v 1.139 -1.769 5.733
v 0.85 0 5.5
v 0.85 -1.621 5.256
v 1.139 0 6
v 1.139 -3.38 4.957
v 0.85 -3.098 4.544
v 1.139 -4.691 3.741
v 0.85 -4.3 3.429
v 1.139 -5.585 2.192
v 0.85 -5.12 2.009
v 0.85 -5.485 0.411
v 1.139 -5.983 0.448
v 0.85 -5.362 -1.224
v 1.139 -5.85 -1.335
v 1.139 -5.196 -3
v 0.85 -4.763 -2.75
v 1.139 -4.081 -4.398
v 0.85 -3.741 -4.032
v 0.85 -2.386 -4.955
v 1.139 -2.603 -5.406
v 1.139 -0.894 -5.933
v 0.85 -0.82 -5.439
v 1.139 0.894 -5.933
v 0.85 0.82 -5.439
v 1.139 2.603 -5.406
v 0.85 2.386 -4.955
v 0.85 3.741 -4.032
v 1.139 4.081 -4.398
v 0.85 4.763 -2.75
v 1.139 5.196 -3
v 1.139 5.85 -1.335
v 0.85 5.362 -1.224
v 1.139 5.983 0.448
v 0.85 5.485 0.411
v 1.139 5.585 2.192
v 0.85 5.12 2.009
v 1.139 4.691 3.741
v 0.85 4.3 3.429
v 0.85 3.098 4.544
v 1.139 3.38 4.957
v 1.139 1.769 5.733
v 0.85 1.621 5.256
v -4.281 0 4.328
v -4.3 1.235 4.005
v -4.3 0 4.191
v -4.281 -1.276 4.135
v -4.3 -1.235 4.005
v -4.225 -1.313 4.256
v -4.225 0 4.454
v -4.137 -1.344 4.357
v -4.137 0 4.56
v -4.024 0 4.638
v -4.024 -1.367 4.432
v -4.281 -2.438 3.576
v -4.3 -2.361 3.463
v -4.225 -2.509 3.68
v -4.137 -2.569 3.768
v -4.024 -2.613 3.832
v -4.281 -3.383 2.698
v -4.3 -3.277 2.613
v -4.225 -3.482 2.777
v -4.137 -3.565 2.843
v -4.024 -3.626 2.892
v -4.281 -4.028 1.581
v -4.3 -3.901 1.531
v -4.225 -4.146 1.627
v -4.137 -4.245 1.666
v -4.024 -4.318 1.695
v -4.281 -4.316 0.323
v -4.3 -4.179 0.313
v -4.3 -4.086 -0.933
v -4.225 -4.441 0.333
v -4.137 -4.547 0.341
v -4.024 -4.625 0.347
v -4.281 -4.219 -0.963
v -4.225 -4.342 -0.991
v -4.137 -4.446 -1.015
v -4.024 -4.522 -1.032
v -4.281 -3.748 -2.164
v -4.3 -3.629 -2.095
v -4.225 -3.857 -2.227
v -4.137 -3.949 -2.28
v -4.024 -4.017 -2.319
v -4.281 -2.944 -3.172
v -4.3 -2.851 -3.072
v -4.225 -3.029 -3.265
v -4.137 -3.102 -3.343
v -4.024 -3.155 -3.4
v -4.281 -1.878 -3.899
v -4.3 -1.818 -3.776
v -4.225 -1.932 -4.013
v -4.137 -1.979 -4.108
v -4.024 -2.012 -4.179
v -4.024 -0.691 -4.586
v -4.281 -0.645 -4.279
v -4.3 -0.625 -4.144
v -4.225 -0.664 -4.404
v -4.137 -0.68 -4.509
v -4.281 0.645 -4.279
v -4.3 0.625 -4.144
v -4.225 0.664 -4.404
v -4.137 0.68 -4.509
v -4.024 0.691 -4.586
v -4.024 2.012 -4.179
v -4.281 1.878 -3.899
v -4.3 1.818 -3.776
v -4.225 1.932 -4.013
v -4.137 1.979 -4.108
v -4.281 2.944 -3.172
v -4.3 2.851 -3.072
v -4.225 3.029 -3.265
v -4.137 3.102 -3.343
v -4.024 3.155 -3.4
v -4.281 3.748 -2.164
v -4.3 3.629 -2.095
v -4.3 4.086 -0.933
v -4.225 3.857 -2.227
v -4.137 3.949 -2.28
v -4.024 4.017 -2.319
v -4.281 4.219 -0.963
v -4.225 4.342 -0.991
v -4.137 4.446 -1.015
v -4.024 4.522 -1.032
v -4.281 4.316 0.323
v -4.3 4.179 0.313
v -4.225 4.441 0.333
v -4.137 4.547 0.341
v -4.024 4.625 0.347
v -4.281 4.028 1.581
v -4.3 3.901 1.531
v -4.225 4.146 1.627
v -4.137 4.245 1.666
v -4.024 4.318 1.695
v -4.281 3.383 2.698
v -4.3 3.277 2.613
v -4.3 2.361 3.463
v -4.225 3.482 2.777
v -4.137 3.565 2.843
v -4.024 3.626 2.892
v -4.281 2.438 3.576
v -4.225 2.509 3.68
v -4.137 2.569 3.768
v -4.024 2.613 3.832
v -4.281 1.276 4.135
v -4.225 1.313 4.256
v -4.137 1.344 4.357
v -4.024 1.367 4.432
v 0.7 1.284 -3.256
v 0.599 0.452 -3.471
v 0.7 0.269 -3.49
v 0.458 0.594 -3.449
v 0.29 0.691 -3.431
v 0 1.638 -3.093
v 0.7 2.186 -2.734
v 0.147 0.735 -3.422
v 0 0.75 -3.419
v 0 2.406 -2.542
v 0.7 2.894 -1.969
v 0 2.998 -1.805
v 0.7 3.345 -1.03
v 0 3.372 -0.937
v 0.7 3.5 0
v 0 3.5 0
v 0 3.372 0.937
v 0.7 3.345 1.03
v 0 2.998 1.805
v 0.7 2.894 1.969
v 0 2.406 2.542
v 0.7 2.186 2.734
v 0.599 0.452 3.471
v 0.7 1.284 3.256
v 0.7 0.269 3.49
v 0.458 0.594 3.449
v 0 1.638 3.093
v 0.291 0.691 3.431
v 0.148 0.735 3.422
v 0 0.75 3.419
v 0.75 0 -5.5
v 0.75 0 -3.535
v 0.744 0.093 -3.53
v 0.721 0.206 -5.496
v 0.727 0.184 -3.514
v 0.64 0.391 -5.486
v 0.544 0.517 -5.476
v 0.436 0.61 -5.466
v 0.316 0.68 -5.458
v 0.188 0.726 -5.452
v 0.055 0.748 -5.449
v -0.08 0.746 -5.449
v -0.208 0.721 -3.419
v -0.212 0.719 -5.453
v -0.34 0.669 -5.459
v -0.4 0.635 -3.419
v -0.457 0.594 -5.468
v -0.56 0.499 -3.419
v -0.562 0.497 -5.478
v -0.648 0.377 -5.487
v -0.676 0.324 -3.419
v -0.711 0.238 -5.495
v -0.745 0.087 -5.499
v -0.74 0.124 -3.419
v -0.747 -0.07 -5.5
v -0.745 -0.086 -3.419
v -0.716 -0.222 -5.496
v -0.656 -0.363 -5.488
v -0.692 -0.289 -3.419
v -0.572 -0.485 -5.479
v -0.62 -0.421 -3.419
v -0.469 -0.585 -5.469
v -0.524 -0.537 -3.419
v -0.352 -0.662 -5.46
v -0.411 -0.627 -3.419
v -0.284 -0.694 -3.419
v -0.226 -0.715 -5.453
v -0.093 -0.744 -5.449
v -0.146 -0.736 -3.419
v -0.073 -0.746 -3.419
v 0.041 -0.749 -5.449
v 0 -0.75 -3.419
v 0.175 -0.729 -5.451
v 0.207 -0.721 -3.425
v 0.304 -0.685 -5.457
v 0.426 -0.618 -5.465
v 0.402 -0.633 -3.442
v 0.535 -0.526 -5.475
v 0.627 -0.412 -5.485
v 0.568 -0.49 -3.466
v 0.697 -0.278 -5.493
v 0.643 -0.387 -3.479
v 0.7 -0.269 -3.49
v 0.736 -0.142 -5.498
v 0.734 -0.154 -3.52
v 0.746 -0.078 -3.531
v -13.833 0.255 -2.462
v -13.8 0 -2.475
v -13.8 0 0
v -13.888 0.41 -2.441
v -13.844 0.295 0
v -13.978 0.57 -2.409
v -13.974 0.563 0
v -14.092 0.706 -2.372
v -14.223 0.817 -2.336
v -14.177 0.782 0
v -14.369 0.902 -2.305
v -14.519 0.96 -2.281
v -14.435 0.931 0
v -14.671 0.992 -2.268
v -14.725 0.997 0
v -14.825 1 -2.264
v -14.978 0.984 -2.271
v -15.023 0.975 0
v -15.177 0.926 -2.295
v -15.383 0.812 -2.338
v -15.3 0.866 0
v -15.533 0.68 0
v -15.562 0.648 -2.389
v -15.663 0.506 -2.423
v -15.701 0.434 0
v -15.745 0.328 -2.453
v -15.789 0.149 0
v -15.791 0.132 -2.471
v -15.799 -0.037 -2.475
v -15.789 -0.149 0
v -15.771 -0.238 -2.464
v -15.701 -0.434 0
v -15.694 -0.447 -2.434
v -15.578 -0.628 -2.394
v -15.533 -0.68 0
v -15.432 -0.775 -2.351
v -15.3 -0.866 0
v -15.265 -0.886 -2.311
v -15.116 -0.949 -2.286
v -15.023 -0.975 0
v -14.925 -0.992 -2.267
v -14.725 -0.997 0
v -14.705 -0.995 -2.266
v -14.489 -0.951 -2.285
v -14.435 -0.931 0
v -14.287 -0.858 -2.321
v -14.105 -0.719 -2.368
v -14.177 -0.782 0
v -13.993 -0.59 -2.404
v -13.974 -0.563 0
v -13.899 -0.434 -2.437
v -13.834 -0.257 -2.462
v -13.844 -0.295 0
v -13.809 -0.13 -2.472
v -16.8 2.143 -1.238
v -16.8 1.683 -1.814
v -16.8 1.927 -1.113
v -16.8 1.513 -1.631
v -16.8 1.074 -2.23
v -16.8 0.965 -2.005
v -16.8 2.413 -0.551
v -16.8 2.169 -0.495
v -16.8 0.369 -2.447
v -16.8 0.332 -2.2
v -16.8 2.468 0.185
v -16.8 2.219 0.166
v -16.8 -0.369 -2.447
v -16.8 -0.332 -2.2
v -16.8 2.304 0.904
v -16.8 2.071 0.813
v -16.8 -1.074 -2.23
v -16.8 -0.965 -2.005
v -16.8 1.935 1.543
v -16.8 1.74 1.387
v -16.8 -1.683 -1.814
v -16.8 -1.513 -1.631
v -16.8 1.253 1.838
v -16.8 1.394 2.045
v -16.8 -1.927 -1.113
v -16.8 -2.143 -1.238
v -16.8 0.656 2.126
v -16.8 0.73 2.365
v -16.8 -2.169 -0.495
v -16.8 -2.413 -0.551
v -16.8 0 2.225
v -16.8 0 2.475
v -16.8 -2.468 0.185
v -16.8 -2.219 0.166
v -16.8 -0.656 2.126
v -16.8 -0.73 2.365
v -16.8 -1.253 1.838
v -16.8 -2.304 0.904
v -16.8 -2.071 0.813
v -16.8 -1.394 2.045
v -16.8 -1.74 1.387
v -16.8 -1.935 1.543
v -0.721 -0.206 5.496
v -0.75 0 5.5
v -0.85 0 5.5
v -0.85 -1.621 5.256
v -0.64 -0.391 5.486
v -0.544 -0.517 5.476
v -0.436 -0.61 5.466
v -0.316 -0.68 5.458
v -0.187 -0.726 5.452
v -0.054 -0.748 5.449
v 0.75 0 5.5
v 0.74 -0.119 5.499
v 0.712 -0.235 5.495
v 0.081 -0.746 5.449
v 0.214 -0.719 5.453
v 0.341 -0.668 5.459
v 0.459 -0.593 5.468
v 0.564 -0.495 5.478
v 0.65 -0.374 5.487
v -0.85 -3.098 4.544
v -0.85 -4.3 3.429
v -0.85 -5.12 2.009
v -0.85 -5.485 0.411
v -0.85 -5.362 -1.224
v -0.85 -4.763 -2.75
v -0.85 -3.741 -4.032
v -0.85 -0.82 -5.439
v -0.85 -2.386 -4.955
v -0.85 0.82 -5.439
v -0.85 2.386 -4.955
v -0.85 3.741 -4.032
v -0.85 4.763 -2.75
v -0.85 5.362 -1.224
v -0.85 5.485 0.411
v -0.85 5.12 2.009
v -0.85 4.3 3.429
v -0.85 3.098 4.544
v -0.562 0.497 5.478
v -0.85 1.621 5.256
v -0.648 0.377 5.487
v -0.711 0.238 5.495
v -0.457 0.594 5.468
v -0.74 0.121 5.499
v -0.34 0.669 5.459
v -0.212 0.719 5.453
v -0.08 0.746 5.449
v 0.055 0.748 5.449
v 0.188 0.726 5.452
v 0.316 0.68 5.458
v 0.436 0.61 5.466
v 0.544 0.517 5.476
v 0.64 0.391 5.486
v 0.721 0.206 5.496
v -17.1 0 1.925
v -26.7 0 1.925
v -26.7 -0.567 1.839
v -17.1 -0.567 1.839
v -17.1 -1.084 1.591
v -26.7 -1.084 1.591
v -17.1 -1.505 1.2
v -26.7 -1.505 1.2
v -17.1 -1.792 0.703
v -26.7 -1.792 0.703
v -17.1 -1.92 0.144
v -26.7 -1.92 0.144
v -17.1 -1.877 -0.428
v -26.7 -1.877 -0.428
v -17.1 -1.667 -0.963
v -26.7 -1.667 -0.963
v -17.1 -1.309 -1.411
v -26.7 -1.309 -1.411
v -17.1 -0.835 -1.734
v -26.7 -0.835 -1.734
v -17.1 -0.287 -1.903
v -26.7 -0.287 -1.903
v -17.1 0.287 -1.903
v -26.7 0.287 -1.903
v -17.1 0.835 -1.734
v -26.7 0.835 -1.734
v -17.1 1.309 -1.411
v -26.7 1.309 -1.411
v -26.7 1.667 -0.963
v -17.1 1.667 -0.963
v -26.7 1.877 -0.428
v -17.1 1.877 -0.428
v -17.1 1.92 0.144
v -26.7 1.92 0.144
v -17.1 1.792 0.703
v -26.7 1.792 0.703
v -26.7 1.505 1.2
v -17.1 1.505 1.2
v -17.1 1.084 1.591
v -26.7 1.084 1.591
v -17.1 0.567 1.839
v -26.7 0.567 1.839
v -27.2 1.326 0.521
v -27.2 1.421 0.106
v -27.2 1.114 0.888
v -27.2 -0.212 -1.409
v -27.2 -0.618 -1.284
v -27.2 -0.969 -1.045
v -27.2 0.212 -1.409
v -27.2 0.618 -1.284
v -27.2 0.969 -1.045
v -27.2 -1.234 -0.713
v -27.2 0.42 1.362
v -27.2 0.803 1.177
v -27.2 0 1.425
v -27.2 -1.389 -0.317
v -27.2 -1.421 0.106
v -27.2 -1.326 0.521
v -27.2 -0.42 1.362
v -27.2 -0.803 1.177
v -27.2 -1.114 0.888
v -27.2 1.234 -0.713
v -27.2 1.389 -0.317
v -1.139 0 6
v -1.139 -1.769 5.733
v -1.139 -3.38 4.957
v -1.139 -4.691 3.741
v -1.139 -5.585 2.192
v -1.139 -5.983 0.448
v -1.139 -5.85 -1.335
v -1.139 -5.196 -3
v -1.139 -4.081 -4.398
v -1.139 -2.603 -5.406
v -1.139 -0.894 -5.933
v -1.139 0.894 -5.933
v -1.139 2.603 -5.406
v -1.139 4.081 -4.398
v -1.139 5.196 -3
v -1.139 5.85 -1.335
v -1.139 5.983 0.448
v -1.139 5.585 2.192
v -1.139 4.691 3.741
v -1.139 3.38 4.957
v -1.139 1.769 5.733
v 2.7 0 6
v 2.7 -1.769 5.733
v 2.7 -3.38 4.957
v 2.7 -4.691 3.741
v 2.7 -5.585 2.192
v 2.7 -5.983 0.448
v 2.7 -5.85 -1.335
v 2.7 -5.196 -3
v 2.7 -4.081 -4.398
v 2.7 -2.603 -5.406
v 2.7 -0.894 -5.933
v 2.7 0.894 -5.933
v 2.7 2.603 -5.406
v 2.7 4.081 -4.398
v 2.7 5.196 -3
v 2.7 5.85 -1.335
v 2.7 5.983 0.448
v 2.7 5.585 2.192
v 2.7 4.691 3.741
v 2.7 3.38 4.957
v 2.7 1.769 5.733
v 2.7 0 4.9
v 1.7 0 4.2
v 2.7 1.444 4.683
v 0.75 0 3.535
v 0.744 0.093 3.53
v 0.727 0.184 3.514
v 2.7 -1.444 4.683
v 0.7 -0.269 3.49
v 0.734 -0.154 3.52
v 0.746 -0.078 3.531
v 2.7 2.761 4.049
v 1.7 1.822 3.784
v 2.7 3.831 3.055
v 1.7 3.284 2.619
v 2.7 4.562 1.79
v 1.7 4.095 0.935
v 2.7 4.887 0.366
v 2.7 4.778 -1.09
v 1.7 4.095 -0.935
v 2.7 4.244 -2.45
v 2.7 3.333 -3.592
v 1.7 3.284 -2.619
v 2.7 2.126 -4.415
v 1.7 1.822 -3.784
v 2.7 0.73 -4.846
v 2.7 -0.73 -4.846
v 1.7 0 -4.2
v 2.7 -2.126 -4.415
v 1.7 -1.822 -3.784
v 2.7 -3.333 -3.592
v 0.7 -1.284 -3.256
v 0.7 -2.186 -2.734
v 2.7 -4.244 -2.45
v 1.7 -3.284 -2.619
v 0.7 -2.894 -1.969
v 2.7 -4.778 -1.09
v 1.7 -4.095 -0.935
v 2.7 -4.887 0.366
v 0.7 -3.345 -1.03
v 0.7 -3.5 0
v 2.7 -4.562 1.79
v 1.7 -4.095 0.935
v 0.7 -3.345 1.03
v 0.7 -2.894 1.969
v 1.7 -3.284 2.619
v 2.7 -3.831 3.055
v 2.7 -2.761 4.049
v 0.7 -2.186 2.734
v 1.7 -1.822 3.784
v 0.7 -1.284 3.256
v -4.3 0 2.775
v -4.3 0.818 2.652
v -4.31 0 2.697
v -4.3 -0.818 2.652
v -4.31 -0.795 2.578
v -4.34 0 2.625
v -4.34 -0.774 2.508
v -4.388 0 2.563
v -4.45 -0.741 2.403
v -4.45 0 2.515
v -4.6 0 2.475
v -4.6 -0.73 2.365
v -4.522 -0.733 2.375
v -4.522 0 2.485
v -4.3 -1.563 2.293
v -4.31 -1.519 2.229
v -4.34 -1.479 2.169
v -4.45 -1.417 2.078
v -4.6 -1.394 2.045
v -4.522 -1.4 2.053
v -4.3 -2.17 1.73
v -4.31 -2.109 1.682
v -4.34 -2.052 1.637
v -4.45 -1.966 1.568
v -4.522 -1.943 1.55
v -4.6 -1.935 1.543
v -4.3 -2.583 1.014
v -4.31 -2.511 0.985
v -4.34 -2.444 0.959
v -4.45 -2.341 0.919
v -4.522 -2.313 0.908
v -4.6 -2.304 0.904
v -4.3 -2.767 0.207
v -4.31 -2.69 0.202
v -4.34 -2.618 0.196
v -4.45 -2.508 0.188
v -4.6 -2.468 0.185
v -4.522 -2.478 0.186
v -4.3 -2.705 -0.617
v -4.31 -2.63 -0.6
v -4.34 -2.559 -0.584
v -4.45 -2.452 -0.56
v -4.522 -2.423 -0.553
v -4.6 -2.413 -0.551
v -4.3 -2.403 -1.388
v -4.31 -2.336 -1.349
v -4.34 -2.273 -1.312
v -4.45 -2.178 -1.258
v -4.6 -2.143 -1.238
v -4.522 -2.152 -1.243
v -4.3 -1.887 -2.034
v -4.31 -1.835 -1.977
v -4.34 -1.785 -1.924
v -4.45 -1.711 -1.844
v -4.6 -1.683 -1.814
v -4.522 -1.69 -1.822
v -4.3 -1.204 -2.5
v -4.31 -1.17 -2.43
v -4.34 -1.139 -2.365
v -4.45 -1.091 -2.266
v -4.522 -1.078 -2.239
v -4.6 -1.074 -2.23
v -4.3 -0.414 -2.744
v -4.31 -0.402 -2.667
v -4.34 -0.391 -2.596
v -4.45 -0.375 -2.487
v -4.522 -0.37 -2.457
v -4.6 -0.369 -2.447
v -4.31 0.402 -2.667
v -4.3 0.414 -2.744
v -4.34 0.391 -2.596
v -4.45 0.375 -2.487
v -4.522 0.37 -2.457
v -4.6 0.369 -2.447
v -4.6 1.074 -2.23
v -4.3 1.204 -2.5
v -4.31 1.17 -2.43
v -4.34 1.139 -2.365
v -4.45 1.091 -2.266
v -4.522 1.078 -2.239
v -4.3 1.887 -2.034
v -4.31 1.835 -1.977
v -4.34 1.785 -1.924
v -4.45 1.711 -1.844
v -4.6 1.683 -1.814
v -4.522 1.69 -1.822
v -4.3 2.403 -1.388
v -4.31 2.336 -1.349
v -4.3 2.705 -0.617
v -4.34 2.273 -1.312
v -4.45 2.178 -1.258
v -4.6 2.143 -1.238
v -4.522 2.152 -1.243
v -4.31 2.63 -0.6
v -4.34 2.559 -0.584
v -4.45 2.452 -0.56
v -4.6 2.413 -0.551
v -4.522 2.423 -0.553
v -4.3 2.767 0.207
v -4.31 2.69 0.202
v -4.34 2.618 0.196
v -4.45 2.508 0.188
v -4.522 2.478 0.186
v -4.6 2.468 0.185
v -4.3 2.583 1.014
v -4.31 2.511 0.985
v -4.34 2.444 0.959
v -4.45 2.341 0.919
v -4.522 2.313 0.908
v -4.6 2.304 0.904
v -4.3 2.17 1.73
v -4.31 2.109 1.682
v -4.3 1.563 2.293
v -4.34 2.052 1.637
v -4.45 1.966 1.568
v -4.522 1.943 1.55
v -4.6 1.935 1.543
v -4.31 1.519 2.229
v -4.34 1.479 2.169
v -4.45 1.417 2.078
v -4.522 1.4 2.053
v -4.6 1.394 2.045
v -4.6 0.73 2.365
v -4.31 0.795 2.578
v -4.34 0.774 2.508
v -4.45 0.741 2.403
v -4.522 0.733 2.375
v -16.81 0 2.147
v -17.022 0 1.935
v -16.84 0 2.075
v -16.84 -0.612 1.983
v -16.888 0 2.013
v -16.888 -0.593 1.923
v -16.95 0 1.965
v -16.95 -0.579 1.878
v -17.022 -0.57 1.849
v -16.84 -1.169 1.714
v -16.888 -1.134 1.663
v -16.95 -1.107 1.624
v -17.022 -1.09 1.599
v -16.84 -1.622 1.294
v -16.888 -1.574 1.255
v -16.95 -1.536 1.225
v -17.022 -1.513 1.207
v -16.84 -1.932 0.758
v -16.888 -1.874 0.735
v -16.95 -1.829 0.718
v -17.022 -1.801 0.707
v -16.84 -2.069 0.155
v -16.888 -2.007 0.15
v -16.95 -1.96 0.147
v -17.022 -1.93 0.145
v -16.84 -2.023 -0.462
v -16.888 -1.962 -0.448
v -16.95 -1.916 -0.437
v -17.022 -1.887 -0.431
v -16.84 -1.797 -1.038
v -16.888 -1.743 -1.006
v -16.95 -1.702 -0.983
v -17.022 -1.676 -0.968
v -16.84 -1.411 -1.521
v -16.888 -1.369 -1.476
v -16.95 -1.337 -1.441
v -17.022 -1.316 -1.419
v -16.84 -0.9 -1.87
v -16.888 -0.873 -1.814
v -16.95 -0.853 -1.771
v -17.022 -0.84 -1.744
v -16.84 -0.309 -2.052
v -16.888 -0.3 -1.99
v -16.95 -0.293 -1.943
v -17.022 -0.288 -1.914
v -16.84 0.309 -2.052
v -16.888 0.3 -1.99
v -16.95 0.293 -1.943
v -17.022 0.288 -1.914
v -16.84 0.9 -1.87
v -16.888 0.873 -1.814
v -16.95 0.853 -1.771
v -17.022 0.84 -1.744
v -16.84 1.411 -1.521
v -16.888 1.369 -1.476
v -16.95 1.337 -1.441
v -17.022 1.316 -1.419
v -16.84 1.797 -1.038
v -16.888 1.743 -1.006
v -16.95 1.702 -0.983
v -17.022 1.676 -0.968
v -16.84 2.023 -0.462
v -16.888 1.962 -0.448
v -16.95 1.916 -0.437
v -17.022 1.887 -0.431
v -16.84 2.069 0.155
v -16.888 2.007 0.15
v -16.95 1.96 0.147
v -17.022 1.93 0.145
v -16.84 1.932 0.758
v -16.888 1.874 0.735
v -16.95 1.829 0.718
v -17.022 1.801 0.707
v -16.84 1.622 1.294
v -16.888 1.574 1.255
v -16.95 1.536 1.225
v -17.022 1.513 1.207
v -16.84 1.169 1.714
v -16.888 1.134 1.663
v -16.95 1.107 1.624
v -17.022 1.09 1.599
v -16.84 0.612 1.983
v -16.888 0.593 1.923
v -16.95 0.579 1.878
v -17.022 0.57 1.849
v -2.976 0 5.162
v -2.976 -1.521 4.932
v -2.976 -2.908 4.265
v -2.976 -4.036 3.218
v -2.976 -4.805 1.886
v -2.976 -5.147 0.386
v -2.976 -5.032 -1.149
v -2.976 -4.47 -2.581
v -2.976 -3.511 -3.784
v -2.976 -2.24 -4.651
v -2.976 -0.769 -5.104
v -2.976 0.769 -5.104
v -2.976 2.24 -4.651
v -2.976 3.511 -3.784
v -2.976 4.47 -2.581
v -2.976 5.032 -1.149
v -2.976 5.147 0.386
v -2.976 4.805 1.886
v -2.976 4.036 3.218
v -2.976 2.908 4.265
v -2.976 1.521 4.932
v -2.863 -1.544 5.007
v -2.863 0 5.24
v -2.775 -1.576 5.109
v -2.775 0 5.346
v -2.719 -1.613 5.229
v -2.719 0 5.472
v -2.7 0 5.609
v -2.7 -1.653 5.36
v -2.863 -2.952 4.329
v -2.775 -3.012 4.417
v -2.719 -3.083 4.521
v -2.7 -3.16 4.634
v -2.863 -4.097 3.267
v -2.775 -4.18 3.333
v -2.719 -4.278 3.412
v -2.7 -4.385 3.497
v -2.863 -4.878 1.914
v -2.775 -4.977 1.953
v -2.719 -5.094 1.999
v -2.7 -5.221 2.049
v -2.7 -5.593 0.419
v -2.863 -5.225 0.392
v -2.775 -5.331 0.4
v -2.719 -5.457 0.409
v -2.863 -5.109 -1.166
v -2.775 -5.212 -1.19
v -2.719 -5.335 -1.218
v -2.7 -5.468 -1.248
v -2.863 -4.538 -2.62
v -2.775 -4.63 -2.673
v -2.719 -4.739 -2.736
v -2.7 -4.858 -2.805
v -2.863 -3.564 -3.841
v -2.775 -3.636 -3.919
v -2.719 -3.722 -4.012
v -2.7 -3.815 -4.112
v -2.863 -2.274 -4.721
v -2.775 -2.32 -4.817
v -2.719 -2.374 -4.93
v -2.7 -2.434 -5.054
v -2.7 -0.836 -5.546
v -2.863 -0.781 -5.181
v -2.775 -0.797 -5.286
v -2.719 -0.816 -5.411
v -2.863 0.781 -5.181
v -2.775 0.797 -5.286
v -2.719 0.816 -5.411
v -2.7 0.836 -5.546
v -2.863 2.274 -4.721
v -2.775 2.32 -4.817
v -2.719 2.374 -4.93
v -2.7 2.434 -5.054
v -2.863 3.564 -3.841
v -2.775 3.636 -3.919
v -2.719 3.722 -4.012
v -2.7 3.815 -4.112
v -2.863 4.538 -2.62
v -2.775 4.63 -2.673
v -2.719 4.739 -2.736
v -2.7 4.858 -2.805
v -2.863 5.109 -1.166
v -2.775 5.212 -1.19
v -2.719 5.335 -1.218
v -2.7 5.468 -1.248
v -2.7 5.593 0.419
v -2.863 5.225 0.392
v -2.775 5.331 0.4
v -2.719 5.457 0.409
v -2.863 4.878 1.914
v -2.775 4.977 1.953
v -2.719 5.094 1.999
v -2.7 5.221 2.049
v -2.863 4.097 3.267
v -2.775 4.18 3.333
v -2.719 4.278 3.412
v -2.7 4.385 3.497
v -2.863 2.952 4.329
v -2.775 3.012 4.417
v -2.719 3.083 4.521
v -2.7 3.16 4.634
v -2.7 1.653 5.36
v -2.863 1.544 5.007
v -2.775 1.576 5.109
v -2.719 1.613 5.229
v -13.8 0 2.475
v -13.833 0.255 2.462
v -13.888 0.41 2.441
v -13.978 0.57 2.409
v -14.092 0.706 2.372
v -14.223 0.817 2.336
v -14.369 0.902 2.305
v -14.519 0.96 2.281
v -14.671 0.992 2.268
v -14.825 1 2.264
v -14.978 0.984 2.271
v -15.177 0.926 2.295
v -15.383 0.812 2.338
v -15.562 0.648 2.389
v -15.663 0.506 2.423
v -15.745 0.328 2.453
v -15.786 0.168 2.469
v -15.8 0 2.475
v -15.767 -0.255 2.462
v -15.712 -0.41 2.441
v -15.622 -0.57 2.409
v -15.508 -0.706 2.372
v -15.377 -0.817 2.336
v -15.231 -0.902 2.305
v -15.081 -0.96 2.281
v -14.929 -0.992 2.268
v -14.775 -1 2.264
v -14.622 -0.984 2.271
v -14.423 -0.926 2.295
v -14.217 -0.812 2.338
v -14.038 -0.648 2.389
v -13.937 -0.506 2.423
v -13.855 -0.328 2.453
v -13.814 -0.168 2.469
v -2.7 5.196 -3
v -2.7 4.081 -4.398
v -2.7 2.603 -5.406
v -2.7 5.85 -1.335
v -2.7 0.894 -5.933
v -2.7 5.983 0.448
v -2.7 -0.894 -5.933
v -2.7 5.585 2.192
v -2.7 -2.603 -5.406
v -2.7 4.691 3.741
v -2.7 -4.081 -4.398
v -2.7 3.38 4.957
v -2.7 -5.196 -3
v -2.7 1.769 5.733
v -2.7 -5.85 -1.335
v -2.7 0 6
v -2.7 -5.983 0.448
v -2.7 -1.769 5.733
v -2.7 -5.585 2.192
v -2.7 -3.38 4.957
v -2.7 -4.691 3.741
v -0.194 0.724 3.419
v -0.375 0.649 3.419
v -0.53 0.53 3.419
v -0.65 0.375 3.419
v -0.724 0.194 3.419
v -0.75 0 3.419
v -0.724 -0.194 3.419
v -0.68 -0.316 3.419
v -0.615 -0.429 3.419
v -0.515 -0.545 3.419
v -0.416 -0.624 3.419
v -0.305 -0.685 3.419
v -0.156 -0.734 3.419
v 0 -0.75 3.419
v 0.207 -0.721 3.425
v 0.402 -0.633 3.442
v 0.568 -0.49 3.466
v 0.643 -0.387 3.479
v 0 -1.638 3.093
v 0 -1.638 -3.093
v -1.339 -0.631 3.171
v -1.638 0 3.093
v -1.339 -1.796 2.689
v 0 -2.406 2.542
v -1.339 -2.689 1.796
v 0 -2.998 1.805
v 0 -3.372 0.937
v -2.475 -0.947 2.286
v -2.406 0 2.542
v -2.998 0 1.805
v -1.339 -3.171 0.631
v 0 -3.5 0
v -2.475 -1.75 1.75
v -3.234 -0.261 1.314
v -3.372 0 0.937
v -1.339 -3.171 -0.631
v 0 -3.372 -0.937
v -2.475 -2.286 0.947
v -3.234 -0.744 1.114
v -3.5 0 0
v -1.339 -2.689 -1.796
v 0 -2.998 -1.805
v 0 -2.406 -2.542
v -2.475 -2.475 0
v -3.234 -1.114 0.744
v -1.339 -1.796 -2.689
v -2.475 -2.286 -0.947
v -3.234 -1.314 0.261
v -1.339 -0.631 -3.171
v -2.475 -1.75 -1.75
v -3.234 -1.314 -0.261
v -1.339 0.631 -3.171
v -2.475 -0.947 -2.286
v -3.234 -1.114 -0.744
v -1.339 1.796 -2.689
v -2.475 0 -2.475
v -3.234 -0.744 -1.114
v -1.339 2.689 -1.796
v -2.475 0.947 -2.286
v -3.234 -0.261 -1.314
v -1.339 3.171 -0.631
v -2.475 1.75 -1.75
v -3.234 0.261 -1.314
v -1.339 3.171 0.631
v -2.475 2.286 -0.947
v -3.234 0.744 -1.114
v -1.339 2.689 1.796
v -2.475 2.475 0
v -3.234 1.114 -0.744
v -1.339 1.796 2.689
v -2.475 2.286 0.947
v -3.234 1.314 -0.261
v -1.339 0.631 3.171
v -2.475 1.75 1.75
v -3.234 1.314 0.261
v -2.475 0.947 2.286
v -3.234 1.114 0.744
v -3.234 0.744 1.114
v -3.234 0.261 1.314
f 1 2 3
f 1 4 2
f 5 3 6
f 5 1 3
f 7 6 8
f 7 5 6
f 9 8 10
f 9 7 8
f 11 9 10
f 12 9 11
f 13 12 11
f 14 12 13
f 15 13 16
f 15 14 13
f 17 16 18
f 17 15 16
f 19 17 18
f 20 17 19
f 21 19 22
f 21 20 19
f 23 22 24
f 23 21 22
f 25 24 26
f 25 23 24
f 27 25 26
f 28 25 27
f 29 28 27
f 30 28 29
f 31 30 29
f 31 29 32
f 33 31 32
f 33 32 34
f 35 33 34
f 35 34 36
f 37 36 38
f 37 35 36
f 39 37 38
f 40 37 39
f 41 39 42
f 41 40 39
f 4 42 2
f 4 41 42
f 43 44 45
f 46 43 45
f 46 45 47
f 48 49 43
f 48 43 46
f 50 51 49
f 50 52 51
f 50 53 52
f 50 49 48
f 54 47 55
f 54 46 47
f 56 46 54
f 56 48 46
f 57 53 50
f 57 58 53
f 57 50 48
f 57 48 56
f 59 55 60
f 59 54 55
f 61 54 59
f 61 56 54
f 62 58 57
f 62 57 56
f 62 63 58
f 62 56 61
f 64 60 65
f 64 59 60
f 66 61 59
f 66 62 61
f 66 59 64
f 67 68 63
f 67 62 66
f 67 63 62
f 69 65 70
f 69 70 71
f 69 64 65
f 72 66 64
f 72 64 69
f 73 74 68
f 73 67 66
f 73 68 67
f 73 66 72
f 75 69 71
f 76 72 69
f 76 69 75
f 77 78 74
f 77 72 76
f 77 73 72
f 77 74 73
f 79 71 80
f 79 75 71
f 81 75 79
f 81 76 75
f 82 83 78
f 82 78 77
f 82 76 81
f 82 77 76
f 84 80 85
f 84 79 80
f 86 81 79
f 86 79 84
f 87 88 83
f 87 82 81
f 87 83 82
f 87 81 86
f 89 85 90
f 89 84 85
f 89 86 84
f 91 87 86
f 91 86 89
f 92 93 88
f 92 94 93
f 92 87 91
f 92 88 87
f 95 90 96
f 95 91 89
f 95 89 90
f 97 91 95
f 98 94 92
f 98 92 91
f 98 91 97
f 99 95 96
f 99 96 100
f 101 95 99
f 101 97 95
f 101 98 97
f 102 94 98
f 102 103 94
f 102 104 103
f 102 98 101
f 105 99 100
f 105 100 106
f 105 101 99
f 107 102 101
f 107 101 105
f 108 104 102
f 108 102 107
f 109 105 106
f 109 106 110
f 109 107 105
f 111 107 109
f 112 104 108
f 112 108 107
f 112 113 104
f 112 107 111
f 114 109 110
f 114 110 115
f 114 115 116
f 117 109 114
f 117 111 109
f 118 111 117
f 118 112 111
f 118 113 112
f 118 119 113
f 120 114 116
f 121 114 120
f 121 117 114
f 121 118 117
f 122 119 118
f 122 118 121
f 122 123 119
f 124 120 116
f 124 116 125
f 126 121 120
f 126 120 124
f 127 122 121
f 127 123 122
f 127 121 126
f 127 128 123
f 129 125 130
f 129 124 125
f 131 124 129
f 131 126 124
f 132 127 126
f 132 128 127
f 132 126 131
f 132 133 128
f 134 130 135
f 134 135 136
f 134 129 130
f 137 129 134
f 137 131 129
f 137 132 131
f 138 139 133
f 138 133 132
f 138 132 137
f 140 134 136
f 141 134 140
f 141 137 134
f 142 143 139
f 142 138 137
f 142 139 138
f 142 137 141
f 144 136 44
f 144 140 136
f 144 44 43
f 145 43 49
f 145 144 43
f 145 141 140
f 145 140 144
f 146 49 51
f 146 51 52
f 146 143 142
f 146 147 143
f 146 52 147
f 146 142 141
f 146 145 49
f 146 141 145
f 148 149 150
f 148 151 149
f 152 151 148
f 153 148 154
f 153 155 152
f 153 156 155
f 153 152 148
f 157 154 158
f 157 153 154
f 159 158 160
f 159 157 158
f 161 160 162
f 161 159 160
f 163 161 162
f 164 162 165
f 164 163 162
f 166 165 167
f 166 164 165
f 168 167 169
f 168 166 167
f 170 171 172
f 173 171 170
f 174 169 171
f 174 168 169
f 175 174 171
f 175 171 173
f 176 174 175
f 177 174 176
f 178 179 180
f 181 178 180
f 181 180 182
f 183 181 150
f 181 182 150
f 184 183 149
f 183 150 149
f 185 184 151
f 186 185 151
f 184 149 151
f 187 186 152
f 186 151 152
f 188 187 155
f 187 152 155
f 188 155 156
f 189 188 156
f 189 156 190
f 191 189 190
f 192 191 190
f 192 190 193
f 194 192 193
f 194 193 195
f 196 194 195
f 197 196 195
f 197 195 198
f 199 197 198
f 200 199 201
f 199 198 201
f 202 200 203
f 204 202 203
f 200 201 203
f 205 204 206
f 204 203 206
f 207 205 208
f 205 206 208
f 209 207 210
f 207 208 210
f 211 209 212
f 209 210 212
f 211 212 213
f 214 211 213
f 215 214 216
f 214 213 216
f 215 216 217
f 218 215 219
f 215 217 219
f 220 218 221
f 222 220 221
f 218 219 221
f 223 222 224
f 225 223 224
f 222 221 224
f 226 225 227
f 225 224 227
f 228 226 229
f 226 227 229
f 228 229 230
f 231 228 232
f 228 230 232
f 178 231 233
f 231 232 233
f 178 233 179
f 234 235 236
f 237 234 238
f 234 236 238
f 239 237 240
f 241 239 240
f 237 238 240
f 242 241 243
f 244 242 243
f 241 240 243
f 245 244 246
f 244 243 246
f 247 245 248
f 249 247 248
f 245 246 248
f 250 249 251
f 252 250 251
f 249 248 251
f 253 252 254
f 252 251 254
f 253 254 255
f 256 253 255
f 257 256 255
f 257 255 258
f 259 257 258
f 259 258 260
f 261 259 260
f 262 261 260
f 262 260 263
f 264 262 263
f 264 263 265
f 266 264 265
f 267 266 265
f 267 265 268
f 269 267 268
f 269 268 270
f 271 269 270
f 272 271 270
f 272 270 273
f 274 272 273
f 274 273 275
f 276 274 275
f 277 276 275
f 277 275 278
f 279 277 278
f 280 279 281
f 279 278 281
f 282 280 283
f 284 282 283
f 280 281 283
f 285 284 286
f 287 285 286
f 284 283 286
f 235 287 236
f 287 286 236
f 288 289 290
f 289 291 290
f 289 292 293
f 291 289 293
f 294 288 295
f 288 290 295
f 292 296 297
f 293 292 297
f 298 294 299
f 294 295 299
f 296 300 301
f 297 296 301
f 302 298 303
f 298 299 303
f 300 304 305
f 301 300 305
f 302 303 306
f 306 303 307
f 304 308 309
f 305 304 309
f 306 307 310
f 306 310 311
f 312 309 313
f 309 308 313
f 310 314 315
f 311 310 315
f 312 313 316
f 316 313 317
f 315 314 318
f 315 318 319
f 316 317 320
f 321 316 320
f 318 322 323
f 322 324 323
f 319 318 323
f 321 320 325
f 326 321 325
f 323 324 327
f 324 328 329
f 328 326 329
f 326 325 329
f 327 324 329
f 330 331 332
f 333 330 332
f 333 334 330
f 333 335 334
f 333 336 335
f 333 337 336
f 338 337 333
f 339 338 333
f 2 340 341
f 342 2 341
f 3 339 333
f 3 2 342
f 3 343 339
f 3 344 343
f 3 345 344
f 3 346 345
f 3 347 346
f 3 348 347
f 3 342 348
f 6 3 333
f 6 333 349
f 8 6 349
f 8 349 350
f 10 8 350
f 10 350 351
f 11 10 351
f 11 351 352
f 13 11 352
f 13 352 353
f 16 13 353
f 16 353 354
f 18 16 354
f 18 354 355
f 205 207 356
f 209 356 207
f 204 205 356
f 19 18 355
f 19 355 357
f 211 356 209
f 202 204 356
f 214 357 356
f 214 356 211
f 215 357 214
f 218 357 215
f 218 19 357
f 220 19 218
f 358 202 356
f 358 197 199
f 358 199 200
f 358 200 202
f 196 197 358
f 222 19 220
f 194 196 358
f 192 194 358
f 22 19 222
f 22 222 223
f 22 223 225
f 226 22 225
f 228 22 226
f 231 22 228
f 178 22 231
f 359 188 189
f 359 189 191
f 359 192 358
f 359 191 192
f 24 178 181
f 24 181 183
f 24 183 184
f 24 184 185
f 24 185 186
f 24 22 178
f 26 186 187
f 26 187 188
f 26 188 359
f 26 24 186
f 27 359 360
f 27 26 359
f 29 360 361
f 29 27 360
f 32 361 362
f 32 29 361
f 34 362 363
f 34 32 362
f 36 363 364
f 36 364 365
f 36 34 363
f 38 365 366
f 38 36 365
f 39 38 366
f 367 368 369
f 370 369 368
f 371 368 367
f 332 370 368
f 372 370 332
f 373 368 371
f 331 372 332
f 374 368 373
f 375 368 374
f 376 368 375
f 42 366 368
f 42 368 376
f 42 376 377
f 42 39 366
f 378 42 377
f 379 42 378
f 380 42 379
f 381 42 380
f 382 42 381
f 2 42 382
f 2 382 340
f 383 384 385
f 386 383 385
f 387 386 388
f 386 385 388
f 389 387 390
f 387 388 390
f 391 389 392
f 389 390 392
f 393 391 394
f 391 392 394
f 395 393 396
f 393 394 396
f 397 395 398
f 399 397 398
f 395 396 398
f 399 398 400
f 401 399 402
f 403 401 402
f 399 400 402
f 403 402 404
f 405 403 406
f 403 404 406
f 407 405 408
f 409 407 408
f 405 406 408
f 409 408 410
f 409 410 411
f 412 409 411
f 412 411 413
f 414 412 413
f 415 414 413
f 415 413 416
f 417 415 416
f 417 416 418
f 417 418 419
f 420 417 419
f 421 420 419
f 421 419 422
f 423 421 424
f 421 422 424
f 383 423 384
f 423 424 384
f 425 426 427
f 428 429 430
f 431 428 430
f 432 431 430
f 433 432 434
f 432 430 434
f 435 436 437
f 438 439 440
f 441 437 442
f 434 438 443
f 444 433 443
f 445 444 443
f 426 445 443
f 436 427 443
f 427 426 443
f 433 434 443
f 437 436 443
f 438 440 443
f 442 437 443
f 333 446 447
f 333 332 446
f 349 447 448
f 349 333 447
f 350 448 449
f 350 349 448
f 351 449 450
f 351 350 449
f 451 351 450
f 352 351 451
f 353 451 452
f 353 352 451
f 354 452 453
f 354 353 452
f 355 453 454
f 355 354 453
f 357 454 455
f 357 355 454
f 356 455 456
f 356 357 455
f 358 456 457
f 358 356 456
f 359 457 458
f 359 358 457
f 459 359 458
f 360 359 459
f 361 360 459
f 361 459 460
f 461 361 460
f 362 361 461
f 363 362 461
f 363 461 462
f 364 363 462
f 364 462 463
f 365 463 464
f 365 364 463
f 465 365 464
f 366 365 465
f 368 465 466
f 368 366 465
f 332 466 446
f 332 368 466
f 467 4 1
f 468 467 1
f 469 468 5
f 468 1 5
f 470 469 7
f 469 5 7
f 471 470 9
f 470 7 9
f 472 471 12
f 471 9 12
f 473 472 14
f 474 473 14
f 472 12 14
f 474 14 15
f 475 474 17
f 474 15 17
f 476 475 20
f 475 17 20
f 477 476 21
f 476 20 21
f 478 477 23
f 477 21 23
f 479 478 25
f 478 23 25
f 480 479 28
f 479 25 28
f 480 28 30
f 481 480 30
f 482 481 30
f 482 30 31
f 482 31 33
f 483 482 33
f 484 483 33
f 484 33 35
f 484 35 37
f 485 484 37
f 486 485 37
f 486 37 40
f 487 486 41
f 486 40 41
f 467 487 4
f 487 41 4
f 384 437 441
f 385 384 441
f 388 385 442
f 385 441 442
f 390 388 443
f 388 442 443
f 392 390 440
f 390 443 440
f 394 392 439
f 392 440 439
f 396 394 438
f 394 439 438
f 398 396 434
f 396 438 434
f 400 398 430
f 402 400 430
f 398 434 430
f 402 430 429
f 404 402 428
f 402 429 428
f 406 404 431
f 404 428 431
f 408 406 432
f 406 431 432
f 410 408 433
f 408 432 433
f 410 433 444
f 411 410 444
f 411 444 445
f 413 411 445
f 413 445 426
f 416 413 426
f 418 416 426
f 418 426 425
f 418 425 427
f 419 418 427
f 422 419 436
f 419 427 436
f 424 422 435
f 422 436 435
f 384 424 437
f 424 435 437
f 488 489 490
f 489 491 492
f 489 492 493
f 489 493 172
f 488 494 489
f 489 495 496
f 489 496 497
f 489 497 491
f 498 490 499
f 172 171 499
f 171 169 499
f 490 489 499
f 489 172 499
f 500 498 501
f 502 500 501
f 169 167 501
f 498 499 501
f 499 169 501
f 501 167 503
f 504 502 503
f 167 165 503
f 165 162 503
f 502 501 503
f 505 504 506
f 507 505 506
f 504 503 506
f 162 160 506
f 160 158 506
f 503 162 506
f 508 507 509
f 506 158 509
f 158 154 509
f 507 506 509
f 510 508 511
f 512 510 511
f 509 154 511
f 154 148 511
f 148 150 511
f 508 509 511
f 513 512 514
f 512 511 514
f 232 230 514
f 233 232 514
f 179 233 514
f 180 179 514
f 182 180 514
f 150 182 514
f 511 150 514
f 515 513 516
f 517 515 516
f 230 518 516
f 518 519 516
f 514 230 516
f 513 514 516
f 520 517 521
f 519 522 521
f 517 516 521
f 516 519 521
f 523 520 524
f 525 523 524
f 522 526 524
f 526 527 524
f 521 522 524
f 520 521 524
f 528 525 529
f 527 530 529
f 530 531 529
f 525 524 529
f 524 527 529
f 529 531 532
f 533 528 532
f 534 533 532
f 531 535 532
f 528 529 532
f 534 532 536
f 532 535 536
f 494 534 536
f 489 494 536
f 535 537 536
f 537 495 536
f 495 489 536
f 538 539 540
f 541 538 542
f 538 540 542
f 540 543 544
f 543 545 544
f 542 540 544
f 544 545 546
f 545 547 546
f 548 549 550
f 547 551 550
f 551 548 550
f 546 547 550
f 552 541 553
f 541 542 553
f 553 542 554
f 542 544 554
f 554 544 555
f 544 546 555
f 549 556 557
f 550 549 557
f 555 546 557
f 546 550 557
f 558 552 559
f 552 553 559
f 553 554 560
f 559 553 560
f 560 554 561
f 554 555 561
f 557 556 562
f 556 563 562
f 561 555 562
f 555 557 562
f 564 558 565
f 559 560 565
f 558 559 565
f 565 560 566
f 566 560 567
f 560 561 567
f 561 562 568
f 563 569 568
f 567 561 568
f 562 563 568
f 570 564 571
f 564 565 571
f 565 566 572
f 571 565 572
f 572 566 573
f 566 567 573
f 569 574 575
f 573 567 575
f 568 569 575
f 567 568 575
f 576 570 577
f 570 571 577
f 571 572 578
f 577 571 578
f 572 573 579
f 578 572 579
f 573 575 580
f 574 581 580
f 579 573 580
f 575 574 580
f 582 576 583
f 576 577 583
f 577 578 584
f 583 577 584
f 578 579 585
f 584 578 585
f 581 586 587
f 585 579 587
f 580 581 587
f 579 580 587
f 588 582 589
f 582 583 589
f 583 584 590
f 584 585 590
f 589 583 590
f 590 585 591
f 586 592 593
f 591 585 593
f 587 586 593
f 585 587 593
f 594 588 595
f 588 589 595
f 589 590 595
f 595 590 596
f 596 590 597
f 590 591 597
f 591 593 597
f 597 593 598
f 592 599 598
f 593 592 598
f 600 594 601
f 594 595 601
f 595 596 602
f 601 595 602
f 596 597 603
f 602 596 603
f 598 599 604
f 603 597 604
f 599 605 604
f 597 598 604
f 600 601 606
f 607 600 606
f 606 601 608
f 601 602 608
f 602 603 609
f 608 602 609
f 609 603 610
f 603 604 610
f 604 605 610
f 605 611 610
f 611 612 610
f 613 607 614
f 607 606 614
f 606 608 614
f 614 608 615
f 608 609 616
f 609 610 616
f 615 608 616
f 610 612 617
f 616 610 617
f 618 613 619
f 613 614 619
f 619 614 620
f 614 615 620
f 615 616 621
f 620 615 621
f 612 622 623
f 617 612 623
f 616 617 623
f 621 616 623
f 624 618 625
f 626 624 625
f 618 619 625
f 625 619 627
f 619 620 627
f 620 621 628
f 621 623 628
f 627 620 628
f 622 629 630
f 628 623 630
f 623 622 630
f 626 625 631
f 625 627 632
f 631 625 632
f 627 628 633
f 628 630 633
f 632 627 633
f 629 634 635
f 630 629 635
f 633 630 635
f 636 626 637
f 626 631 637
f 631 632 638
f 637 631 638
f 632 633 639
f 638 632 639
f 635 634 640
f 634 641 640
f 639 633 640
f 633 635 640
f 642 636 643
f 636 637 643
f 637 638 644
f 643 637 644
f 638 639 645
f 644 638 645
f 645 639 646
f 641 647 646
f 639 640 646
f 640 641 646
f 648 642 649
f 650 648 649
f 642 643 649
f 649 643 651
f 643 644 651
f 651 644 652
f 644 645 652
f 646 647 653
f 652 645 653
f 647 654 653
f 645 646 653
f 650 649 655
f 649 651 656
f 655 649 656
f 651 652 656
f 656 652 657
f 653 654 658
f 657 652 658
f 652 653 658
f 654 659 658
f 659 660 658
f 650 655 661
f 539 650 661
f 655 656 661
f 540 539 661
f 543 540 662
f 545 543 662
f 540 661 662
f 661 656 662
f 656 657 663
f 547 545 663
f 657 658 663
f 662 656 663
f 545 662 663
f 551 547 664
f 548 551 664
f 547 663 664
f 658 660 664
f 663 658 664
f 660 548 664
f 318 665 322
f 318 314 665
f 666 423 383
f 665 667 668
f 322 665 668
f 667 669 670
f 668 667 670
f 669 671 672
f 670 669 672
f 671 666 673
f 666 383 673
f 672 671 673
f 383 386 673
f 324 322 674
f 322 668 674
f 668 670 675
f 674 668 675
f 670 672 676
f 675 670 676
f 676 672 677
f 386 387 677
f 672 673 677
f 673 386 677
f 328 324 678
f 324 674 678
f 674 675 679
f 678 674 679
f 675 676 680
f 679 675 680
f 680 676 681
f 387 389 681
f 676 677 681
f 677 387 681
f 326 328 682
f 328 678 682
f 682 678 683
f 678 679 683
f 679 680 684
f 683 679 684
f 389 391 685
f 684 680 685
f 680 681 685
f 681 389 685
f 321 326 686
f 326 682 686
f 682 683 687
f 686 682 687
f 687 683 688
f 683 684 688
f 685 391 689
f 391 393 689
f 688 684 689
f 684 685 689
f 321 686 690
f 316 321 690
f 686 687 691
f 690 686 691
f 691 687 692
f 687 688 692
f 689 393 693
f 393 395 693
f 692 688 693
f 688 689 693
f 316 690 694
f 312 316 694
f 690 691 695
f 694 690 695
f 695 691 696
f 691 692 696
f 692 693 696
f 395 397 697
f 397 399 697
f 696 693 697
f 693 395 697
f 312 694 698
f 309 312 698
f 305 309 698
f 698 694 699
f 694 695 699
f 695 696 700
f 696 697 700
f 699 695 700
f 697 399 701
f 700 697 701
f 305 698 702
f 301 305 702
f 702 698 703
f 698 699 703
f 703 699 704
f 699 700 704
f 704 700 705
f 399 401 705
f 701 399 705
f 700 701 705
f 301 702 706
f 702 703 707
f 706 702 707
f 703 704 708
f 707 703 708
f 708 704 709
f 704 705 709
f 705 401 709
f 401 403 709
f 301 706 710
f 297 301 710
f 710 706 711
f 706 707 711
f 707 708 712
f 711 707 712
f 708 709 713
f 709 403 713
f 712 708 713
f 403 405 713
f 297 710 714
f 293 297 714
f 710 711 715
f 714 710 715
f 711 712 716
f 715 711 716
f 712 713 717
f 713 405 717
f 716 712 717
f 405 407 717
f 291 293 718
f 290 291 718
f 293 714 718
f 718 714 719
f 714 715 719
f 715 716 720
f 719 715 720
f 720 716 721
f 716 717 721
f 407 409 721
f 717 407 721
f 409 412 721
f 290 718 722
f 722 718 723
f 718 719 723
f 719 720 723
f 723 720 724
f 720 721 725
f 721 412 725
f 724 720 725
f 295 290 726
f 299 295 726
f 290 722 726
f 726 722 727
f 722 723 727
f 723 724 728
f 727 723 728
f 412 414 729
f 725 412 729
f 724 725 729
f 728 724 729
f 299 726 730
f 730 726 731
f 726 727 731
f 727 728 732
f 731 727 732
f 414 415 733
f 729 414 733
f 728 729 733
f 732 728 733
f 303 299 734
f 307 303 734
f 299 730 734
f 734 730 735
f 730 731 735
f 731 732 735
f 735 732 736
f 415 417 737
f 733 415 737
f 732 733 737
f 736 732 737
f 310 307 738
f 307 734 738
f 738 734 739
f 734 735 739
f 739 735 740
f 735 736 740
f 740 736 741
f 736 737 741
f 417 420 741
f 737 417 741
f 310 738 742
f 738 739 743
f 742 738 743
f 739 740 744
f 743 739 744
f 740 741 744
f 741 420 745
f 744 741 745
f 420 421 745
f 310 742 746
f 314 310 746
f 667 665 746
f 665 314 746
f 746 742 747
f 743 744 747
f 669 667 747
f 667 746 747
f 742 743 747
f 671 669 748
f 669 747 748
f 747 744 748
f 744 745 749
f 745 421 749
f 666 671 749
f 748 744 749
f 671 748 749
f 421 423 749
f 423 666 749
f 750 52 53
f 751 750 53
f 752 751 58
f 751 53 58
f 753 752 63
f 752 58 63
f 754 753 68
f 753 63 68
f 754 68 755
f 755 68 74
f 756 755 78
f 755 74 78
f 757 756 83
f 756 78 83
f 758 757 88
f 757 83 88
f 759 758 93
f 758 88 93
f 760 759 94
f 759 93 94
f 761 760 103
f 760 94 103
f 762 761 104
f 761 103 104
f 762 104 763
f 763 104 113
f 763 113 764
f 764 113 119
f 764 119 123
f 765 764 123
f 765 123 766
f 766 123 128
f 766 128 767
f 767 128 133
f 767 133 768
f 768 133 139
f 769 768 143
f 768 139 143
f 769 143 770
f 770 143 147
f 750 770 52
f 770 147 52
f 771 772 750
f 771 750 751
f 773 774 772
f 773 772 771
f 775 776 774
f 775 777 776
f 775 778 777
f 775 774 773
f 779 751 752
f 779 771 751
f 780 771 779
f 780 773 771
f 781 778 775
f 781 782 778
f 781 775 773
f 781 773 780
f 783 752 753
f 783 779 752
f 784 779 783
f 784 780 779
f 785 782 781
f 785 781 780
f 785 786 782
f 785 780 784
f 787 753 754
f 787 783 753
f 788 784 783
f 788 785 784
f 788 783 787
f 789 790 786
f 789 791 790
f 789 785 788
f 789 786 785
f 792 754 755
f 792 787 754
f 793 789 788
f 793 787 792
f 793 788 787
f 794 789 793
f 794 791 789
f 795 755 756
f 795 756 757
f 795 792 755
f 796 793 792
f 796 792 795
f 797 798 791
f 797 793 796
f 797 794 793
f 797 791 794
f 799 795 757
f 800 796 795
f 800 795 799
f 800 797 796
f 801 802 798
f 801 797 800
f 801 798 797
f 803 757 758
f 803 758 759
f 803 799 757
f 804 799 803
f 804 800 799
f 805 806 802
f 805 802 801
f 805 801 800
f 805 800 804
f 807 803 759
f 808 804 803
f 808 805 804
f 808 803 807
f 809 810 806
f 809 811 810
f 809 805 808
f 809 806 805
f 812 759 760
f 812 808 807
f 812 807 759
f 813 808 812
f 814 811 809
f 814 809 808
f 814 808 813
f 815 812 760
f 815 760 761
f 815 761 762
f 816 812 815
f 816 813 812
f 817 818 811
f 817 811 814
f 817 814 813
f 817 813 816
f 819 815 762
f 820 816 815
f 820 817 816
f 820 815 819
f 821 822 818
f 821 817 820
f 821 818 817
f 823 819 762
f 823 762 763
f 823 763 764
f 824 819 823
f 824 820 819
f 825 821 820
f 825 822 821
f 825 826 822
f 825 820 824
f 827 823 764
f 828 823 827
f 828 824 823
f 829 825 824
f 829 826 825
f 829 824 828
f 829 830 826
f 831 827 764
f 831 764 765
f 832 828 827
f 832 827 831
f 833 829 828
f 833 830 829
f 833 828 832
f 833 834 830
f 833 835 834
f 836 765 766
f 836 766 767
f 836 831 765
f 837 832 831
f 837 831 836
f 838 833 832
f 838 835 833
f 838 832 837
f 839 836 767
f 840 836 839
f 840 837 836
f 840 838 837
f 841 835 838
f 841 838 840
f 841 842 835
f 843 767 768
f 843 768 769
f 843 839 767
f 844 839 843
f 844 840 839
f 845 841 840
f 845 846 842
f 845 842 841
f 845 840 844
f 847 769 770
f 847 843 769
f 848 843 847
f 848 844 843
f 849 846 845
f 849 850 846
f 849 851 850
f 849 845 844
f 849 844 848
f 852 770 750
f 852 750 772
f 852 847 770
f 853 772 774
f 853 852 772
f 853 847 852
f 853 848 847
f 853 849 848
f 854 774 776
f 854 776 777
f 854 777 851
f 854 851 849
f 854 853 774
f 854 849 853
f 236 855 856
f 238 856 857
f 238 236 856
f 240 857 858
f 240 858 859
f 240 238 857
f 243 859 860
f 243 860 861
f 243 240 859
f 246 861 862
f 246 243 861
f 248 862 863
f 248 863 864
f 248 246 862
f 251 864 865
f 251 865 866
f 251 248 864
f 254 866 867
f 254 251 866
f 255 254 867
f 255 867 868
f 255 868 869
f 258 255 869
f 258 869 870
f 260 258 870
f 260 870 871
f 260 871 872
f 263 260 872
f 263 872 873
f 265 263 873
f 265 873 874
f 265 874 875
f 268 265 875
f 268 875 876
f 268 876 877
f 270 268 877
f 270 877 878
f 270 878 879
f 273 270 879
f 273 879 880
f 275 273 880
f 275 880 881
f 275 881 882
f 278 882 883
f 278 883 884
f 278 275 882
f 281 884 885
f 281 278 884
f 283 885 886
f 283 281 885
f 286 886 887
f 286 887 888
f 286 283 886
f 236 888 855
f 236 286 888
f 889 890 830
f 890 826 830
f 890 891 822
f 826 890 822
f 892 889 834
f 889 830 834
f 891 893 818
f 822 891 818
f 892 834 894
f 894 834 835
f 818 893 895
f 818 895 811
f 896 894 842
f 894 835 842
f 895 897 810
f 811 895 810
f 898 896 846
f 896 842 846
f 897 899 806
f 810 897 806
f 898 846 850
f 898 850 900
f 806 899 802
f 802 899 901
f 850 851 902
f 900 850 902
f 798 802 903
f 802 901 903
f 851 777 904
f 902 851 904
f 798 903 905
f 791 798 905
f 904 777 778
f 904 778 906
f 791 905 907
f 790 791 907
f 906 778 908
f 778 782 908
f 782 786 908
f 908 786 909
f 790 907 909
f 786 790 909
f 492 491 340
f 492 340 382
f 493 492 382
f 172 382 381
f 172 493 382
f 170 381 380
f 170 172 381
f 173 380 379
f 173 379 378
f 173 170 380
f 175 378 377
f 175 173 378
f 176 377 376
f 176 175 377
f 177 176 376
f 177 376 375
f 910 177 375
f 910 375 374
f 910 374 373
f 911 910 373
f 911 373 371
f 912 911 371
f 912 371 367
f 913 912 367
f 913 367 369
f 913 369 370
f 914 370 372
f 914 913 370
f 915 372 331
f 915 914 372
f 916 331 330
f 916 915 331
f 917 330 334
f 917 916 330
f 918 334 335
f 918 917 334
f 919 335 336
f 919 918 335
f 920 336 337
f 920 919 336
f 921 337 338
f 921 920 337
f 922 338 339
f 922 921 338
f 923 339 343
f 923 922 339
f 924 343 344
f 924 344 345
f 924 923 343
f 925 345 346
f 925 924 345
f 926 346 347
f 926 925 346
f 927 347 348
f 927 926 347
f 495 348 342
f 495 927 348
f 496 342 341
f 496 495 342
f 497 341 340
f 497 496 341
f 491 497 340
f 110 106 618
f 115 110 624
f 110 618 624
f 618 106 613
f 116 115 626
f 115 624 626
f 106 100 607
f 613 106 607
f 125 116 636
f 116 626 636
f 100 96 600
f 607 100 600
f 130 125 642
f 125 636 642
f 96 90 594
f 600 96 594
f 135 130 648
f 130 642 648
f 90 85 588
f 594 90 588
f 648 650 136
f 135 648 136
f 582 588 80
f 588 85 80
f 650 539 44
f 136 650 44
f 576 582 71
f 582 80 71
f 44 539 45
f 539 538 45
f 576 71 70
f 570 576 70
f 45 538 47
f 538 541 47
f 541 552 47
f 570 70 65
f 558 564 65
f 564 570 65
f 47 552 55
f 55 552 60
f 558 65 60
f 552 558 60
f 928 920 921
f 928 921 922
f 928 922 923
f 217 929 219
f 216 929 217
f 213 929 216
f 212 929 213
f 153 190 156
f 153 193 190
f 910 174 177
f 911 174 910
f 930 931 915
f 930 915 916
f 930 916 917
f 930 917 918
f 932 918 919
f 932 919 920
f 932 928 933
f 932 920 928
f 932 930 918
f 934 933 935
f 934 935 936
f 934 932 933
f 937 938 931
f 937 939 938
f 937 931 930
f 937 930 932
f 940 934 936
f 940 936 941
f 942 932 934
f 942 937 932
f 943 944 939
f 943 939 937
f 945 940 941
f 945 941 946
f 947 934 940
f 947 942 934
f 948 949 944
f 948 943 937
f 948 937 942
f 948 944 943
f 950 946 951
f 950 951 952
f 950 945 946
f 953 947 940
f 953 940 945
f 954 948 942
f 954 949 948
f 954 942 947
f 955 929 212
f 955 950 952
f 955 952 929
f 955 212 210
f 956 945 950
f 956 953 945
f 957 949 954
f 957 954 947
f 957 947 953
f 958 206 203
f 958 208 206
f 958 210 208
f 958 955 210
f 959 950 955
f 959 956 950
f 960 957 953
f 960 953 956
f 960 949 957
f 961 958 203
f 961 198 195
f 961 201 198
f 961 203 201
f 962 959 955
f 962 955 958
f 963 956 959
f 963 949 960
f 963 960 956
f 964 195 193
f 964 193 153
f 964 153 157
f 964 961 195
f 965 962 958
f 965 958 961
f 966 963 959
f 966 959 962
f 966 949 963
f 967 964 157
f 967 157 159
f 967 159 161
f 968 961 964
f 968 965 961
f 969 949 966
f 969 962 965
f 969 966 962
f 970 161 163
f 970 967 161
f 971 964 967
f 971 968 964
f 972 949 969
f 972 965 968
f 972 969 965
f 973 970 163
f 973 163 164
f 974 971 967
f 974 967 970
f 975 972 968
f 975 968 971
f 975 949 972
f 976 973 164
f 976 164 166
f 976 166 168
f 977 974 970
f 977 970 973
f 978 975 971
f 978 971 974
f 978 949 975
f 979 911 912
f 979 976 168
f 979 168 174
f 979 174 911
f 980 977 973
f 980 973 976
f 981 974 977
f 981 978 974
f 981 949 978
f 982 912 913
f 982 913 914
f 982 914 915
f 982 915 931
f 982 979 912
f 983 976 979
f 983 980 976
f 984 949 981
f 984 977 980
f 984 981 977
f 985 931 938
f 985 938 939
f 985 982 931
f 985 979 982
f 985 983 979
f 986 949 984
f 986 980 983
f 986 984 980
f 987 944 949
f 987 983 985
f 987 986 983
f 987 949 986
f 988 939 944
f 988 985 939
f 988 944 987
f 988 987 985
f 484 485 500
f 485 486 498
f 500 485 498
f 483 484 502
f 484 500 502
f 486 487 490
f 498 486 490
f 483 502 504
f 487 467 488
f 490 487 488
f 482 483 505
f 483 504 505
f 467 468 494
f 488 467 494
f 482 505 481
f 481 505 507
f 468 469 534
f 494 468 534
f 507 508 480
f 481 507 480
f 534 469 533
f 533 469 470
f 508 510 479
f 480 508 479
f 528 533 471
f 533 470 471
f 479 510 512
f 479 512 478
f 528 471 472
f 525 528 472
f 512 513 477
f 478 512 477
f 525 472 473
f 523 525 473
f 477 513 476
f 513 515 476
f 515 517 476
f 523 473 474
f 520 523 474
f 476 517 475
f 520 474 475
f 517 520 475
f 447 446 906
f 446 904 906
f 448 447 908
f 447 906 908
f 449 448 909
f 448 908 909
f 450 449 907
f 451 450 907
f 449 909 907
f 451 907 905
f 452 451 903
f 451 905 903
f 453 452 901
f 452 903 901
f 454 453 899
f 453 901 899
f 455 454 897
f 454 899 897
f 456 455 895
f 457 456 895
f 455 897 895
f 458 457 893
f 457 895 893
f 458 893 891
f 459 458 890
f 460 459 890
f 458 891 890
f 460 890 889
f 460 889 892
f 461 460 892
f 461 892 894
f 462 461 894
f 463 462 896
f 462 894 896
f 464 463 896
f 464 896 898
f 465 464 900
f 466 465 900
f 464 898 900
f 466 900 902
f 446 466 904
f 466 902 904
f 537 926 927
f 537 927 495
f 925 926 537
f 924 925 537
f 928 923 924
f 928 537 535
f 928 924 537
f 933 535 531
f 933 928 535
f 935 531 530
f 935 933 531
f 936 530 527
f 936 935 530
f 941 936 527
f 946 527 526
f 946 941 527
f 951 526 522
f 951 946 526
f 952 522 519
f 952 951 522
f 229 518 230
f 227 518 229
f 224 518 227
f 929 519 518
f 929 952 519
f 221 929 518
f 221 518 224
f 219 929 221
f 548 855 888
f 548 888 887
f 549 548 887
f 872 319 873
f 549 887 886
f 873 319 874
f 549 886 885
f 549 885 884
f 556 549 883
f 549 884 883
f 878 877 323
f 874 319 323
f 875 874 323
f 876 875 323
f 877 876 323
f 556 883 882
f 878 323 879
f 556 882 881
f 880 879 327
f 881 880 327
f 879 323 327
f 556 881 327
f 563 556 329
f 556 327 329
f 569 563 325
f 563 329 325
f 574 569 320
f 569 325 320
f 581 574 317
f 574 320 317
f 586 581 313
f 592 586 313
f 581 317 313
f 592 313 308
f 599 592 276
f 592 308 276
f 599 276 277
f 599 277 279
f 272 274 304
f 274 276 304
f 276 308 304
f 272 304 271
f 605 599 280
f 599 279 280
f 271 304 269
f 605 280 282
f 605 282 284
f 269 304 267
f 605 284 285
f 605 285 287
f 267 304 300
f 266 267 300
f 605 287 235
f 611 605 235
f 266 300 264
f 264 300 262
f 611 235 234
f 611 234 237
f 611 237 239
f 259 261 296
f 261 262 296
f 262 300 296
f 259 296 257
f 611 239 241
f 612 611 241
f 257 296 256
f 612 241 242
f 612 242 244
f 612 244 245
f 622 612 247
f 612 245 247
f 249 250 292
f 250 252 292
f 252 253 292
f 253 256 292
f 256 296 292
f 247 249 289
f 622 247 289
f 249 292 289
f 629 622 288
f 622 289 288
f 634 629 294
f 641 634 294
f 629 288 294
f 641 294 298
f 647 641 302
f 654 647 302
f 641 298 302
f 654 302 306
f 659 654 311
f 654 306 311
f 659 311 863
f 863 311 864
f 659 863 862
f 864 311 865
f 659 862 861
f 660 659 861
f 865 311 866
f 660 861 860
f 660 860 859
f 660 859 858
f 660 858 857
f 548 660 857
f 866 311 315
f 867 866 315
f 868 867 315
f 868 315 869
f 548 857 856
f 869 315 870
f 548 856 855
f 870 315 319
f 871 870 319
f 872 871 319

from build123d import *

# Parameters (mm, degrees)
F8_R          = 0.75
F8_R_2        = 1
F9_DEPTH      = 6.001
F9_DEPTH_BACK = 6.001
F11_SIZE      = 0.5
F12_R         = 0.5
F13_R         = 0.3


# Not quite as in the source:
# - a fillet or chamfer that OpenCascade refuses, or shapes differently, is made with other operations: its cross-section is extruded or revolved along the edge and cut away or added


with BuildPart() as f4:
    # F3 (on Front) → F4 (revolve)
    with BuildSketch(Plane.XZ):
        with BuildLine():
            Line((2.7, 6), (-2.7, 6))
            Line((-2.7, 6), (-2.7, 5.3))
            Line((-2.7, 5.3), (-4.3, 4.5))
            Line((-4.3, 4.5), (-4.3, 2.775))
            ThreePointArc((-4.3, 2.775), (-4.3878679656, 2.5628679656), (-4.6, 2.475))
            Line((-4.6, 2.475), (-16.8, 2.475))
            Line((-16.8, 2.475), (-16.8, 1.925))
            Line((-16.8, 1.925), (-27.2, 1.925))
            Line((-27.2, 1.925), (-27.2, 0))
            Line((-27.2, 0), (2.7, 0))
            Line((2.7, 0), (2.7, 6))
        make_face()
    revolve(axis=Axis((0, 0, 0), (1, 0, 0)))

    # F2 (on Front) → F5 (revolve, cut)
    with BuildSketch(Plane.XZ):
        with BuildLine():
            Line((5, 3.5), (0, 3.5))
            ThreePointArc((0, 3.5), (-2.4748737342, 2.4748737342), (-3.5, 0))
            Line((-3.5, 0), (5, 0))
            Line((5, 0), (5, 3.5))
        make_face()
    revolve(axis=Axis((0, 0, 0), (1, 0, 0)), mode=Mode.SUBTRACT)

    # F6 (on Front) → F7 (revolve, cut)
    with BuildSketch(Plane.XZ):
        Polygon((1.1386751346, 6), (-1.1386751346, 6), (-0.85, 5.5), (0.85, 5.5), align=None)
    revolve(axis=Axis((0, 0, 0), (1, 0, 0)), mode=Mode.SUBTRACT)

    # F8 (on Top) → F9 (cut, two sides)
    with BuildSketch(Plane.XY) as f9_sk:
        Circle(F8_R)
        with Locations((-14.8, 0)):
            Circle(F8_R_2)
    extrude(amount=-F9_DEPTH, mode=Mode.SUBTRACT)
    extrude(f9_sk.sketch, amount=F9_DEPTH_BACK, mode=Mode.SUBTRACT)

    # F10: chamfer of 2 x 1.4004150764 on 1 edges, made by hand

    # F10_s1 → F10_t2 (revolve, cut)
    with BuildSketch(Plane.XZ):
        Polygon((2.7, 4.9004150764), (0.7, 3.5), (2.7, 3.5), align=None)
    revolve(axis=Axis((2.7, 0, 0), (-1, 0, 0)), mode=Mode.SUBTRACT)

    # F11
    f11_edges = [f4.edges().sort_by_distance(p)[0] for p in [
        (-27.2, 0, -1.925),
    ]]
    chamfer(f11_edges, length=F11_SIZE)

    # F12
    f12_edges = [f4.edges().sort_by_distance(p)[0] for p in [
        (-4.3, 0, -4.5),
        (-2.7, 0, -5.3),
    ]]
    fillet(f12_edges, radius=F12_R)

    # F13
    f13_edges = [f4.edges().sort_by_distance(p)[0] for p in [
        (-16.8, 0, -1.925),
    ]]
    fillet(f13_edges, radius=F13_R)


solid = f4.part
